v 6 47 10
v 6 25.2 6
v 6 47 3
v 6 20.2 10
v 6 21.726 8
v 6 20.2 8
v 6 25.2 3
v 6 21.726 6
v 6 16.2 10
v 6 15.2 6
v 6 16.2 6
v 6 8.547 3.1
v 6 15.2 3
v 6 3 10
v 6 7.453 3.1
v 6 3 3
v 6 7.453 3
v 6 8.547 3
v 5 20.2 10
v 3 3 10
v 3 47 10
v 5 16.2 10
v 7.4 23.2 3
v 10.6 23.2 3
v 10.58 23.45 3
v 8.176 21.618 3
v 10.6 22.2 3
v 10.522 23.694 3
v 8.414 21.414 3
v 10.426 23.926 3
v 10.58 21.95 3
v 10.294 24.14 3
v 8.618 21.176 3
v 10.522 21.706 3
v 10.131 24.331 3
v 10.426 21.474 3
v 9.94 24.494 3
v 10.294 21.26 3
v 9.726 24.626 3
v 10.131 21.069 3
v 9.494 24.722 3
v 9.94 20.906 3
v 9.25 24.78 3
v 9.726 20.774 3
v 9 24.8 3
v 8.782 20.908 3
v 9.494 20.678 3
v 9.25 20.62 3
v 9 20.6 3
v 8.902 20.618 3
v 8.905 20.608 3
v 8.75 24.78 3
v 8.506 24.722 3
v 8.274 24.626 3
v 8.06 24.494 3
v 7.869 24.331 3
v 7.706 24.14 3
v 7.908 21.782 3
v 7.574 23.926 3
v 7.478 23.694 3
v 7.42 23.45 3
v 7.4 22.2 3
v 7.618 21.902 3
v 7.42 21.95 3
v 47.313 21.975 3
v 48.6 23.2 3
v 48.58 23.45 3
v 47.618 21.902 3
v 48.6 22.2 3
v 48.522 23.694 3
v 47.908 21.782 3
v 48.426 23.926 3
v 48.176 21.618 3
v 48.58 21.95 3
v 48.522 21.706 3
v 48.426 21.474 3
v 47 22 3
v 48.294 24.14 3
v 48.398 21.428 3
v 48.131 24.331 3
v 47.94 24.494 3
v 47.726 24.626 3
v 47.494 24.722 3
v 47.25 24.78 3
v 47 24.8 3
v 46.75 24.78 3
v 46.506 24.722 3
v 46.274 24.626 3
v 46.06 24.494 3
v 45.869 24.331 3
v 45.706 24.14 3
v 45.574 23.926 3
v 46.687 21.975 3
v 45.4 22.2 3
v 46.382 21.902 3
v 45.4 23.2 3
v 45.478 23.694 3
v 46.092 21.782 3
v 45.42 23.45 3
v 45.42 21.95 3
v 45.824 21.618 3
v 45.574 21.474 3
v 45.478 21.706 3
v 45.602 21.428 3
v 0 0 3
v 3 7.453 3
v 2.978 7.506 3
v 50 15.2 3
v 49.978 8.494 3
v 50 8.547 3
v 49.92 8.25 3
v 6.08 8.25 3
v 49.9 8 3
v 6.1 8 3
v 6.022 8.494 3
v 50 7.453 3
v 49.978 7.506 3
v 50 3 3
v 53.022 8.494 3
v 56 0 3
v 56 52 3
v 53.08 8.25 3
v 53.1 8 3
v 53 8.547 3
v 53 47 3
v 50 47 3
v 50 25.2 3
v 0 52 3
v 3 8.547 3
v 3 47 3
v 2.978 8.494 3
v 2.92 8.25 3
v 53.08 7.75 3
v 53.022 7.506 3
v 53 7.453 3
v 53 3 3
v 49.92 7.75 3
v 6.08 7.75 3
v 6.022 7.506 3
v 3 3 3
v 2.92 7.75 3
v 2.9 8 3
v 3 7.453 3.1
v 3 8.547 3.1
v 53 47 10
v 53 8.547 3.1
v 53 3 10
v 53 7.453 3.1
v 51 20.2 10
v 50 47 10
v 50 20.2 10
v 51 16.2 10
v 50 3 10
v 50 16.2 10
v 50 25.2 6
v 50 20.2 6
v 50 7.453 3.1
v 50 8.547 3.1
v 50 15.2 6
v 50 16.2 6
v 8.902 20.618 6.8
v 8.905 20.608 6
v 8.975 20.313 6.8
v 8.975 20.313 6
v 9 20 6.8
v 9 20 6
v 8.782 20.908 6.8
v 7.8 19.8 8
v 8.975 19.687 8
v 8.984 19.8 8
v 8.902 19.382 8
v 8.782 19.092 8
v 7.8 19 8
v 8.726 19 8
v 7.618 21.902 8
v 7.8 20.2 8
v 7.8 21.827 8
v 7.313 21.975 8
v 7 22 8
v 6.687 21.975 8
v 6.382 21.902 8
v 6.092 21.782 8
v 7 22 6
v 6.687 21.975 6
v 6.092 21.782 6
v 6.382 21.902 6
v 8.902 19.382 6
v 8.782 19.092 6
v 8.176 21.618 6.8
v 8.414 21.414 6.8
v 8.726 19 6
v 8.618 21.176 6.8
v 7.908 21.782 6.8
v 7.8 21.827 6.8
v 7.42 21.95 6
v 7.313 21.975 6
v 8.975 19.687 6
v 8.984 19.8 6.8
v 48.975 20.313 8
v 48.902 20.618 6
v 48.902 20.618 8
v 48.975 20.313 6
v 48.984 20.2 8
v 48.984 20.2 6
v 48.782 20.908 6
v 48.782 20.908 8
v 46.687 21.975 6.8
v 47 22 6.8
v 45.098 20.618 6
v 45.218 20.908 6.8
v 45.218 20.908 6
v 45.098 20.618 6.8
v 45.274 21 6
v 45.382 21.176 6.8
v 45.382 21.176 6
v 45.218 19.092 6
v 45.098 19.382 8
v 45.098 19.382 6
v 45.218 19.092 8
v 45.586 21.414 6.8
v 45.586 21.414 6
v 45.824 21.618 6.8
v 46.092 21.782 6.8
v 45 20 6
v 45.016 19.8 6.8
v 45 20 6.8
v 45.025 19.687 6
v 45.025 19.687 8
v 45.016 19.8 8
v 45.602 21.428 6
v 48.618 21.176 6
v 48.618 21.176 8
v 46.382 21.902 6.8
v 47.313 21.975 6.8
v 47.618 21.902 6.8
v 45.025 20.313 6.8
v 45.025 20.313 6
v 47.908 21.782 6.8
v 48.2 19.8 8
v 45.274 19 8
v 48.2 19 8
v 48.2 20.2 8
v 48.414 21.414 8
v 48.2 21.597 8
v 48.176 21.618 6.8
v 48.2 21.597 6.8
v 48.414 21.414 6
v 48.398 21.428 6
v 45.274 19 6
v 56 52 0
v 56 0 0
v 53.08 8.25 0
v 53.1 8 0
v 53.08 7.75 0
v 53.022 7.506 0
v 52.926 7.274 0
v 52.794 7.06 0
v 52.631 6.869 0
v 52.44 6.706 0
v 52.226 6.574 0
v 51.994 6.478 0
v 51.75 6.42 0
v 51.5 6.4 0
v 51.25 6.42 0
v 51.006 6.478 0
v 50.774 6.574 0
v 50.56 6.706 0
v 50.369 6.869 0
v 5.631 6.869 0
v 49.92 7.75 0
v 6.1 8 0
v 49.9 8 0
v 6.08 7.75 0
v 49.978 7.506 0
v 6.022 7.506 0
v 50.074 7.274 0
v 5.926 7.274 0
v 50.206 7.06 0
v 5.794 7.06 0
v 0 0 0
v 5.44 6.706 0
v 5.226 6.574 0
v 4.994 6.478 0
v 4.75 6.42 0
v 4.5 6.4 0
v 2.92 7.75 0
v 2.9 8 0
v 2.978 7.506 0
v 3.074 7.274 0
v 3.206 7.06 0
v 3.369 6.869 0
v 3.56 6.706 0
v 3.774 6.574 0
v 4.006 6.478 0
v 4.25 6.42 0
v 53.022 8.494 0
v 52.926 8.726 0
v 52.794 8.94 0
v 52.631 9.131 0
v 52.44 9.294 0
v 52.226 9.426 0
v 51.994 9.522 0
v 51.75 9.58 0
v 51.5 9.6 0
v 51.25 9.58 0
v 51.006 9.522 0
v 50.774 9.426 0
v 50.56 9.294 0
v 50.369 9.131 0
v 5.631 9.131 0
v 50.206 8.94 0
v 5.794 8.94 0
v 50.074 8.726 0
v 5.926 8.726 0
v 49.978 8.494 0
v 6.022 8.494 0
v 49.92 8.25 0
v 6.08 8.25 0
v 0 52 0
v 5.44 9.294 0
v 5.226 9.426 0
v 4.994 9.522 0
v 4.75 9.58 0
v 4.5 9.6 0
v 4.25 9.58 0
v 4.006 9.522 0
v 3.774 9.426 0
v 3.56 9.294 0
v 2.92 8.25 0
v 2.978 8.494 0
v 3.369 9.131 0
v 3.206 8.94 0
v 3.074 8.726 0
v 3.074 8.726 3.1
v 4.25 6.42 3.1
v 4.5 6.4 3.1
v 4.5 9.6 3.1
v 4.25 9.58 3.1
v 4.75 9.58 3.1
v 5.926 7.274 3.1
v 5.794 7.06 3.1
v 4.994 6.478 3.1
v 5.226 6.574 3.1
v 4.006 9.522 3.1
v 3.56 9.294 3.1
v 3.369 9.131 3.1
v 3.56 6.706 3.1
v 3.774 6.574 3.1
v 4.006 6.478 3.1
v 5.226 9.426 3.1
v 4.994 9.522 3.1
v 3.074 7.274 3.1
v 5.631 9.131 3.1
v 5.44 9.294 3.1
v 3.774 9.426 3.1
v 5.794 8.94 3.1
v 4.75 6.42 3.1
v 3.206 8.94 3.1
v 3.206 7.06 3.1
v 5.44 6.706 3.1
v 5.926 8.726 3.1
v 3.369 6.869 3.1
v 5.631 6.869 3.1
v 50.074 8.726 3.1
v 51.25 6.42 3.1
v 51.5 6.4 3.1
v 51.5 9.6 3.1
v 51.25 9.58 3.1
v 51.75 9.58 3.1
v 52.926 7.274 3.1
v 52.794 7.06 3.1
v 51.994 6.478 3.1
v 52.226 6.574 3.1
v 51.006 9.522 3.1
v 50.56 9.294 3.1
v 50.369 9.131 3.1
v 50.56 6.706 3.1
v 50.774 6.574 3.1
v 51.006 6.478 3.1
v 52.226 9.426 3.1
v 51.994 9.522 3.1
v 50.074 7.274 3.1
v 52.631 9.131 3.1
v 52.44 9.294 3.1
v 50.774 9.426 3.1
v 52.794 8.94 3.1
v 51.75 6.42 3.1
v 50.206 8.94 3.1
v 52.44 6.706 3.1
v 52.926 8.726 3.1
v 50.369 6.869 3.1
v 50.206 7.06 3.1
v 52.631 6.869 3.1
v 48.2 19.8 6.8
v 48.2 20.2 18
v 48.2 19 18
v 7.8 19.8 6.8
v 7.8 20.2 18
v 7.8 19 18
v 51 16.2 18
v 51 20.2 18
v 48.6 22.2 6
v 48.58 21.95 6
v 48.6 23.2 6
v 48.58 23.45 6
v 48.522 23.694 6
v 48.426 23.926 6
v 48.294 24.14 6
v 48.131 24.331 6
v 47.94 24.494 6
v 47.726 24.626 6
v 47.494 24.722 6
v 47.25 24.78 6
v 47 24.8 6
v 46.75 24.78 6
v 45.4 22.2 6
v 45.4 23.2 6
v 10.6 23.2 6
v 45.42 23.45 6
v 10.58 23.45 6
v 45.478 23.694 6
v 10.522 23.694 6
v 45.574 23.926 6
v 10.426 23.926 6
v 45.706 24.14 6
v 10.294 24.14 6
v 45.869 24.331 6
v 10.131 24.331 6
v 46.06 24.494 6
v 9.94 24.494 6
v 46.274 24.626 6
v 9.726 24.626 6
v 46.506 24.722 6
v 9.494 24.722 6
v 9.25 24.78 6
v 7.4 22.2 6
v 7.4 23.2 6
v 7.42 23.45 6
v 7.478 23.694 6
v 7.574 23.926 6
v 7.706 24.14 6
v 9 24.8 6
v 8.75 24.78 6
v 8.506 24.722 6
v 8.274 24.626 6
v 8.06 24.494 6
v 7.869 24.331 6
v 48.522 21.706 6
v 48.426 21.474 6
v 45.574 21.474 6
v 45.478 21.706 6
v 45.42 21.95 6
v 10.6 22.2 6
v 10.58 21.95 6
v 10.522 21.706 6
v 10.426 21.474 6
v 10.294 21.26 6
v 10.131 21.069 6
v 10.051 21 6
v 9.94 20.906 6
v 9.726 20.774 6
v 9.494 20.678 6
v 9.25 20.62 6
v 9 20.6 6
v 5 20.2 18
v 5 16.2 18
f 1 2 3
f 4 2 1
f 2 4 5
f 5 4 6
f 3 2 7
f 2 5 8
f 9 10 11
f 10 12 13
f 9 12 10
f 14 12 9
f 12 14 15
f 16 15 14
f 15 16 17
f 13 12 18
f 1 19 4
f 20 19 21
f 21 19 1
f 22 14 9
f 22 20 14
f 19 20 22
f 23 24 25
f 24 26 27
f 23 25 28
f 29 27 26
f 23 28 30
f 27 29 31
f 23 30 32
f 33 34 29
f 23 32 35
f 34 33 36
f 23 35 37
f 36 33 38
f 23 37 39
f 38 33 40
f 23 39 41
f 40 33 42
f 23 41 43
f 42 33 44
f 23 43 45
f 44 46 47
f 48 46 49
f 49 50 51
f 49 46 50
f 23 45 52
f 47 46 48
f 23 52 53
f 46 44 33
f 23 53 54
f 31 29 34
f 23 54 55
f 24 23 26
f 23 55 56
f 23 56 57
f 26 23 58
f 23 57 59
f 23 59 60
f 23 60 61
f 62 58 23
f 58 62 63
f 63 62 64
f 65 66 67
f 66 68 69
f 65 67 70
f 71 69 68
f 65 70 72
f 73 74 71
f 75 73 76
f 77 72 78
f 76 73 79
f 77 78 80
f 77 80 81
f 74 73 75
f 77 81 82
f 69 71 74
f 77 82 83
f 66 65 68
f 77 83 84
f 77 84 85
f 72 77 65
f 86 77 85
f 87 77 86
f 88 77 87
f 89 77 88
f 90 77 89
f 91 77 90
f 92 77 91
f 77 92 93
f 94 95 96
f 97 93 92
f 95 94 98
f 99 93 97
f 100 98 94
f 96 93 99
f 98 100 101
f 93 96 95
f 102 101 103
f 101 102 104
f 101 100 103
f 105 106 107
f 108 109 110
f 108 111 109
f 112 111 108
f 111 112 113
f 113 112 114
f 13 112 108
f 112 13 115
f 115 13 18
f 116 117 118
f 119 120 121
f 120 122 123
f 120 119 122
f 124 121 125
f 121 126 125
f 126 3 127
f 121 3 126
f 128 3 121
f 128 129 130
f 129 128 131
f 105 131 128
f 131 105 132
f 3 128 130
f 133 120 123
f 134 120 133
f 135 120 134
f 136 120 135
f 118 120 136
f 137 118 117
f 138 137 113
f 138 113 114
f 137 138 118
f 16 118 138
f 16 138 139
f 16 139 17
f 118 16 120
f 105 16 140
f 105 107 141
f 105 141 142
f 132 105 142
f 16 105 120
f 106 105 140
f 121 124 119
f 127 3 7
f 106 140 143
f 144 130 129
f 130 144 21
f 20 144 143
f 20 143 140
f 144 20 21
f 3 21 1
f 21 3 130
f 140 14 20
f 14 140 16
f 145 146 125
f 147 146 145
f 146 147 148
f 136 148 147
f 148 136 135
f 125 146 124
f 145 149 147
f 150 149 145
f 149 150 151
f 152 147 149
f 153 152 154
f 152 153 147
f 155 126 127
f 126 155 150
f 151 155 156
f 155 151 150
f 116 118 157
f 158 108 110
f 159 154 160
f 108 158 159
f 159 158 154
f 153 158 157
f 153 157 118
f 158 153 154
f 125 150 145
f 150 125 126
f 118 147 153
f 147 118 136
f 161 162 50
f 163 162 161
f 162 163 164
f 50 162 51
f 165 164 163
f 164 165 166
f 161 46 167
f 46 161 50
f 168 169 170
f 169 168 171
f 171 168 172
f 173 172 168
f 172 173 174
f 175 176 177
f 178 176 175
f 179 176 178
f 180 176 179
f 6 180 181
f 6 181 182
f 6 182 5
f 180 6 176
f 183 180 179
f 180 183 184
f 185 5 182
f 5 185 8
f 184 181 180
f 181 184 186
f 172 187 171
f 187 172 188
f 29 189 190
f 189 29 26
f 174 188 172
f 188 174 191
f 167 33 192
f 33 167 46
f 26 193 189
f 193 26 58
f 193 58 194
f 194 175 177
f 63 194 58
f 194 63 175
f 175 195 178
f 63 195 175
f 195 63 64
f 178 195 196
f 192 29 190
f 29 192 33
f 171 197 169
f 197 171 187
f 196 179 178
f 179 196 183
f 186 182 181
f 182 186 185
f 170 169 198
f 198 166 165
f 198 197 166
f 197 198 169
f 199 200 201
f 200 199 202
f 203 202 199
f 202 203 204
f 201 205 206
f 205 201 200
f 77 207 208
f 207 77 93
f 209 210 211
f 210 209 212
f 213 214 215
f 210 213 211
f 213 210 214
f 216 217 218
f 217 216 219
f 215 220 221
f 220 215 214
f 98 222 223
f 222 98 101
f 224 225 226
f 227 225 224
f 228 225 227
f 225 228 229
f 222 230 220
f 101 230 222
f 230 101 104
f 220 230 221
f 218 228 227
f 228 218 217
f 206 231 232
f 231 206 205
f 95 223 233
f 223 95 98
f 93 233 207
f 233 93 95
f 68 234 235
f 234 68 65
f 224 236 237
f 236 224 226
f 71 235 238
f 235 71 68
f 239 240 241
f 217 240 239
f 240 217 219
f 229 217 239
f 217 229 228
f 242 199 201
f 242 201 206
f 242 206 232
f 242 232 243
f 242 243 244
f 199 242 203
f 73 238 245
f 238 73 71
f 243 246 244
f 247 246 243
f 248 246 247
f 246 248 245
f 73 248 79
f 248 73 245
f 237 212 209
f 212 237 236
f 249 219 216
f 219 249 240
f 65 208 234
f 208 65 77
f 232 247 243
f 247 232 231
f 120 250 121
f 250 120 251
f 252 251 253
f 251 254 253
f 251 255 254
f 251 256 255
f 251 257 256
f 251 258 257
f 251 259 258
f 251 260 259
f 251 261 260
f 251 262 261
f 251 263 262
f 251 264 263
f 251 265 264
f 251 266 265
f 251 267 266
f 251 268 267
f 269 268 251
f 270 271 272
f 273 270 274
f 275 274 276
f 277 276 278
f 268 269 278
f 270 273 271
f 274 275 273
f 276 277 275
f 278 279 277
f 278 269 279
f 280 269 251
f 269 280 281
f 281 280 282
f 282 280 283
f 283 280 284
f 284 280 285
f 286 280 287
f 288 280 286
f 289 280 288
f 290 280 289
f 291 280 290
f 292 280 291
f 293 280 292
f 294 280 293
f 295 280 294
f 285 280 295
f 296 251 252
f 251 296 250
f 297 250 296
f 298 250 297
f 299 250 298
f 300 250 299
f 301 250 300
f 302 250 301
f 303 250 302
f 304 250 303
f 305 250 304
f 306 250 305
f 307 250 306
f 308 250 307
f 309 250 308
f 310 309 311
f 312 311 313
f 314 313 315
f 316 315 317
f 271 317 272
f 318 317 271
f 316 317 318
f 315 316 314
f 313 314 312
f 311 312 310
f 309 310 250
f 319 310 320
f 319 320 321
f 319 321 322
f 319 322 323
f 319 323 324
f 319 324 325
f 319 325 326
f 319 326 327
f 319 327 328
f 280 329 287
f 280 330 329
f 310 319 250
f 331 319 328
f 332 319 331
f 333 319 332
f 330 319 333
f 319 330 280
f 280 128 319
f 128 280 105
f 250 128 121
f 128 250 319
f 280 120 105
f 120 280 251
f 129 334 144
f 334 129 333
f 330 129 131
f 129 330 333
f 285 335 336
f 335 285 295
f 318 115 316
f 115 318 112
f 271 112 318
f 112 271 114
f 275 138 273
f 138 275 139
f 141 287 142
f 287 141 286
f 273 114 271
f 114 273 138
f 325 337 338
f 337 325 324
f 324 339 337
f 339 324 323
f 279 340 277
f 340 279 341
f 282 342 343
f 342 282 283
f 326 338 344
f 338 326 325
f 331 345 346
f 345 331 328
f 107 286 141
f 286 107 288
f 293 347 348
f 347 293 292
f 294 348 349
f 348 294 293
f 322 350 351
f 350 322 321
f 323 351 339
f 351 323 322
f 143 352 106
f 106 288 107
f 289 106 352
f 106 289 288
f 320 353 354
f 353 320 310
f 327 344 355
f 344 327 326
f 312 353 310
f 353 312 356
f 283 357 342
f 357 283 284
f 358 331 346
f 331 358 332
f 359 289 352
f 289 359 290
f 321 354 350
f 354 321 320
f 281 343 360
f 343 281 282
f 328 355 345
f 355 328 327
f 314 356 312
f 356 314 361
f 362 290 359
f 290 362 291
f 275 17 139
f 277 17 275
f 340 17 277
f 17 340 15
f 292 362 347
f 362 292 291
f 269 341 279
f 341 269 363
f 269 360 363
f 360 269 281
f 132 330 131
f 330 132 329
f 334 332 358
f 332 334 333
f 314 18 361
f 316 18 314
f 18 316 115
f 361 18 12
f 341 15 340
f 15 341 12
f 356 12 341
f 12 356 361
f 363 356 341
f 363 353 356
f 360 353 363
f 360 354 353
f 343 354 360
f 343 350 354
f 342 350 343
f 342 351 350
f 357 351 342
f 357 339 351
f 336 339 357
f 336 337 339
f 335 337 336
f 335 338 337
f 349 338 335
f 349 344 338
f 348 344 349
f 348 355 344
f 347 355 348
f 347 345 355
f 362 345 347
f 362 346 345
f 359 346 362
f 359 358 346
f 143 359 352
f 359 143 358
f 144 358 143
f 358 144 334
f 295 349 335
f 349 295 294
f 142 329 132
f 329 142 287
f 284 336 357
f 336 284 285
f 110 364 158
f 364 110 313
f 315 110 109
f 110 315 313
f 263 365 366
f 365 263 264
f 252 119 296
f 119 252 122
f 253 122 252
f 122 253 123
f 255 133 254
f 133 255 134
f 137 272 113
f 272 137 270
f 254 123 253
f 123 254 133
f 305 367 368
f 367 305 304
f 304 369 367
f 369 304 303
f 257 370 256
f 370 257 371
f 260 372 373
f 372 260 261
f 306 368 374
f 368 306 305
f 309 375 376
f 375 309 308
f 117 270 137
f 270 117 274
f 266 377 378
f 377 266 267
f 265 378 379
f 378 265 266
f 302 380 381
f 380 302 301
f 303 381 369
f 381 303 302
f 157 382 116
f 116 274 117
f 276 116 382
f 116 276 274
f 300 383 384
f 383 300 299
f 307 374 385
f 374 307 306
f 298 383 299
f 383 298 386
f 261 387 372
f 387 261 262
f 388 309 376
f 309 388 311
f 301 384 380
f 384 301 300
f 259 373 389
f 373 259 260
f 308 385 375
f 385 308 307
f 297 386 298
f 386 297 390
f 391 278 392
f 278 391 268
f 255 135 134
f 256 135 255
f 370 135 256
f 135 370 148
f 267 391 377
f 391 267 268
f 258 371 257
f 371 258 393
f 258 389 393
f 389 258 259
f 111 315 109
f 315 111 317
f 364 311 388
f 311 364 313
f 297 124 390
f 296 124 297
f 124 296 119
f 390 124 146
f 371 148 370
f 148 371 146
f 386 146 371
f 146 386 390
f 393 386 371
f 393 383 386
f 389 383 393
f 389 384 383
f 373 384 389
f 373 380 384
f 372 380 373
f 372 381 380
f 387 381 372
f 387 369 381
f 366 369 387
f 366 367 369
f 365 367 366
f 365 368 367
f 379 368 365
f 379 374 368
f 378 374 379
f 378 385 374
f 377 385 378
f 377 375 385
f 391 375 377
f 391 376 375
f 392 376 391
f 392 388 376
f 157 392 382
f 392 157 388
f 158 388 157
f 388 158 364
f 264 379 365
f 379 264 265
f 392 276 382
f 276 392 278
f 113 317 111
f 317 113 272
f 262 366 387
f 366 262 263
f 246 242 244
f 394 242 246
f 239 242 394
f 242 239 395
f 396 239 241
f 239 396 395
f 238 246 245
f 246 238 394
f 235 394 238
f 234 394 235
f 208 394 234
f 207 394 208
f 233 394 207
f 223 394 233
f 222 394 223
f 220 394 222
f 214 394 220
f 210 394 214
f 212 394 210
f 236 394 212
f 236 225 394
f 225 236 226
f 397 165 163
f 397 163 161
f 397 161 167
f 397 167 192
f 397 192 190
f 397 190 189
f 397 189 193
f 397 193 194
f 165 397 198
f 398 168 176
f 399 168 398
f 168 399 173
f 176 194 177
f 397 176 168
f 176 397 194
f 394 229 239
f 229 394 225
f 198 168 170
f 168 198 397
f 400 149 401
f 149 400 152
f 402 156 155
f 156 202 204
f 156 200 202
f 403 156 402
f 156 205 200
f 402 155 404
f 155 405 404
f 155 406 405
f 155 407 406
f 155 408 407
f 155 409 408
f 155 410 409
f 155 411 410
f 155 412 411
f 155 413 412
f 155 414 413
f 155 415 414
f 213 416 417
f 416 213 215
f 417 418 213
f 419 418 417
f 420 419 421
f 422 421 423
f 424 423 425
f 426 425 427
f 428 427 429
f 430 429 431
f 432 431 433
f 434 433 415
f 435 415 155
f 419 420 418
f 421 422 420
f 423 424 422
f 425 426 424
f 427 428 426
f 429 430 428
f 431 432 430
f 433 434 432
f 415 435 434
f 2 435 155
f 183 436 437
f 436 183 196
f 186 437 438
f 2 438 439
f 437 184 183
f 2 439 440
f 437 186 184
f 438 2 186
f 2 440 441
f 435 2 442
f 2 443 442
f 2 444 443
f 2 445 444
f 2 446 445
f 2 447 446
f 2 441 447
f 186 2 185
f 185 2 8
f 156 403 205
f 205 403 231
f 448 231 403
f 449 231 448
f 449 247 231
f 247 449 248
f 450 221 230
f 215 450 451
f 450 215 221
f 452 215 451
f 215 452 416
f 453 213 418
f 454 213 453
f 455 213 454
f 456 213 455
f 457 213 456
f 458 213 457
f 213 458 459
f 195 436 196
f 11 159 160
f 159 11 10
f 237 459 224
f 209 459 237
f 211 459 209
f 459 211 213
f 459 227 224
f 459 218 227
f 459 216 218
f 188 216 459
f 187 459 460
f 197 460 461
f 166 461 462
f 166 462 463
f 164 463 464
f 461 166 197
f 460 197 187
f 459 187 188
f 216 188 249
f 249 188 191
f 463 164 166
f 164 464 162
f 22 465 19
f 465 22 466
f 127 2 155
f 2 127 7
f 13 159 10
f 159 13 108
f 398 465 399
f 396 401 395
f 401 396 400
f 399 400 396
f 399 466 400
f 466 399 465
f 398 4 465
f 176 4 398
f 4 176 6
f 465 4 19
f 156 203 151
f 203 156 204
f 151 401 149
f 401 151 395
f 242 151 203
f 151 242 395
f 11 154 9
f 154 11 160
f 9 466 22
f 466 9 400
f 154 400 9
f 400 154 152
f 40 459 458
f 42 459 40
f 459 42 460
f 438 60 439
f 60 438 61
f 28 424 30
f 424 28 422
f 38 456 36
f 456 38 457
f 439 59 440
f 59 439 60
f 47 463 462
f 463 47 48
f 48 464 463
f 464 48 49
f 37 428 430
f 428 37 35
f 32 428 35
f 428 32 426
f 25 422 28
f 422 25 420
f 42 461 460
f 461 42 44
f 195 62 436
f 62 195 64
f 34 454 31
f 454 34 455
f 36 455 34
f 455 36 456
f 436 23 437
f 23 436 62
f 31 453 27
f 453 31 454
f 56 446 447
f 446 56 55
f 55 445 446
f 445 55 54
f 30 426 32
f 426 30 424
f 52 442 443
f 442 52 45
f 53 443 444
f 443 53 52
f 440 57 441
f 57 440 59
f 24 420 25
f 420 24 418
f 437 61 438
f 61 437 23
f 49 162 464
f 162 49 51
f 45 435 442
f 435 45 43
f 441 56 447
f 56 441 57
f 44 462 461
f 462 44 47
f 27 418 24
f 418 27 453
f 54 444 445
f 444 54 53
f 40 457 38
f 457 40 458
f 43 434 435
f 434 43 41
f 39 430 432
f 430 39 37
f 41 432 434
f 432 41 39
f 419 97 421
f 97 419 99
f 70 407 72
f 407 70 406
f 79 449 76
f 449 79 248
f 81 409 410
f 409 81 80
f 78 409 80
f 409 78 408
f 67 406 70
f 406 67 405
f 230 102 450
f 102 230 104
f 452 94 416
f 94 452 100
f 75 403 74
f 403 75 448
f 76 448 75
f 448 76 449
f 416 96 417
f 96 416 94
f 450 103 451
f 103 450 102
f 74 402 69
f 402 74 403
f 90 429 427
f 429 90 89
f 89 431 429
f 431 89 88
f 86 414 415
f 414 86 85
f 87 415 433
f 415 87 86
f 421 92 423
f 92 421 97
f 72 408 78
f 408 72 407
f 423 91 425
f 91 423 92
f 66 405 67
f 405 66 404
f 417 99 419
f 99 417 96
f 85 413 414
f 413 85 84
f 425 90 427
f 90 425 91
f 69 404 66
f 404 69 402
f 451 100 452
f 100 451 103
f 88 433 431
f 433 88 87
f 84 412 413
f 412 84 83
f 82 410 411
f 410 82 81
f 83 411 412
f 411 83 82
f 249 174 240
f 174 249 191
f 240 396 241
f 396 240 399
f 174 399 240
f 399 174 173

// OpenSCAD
// file: ../common/tile_dimensions.scad
// Shared grid and PCB body contract. See docs/specifications/interfaces.md.
tile_size = 80;
tile_height = 20;
pcb_mount_spacing = 30;
pcb_mount_height = 9;
pcb_preview_size = 68;
pcb_preview_thickness = 1.6;
pcb_preview_hole_diameter = 2.5;
mount_spacing = 24;

// KiCad origin (100,100), CAD X = pcb X-100, CAD Y = 100-pcb Y.
pcb_led_centers = [[-17,23],[17,-23]];

// M2 PCB mounting: ordinary nuts, no inserts or thread-forming screws.
pcb_screw_clearance = 2.2;
pcb_nut_af = 4.3;     // 4.0mm nominal nut plus 0.3mm across-flat clearance.
pcb_nut_depth = 1.8;  // For <=1.6mm nut thickness.

// Hub PCB is elevated so USB plugs clear adjacent tiles and 5.5mm module bases.
hub_height = 42;
hub_pcb_top = 30;
hub_usb_opening_width = 20;
hub_usb_opening_height = 10;
// main file
// Unpowered Harwin side-compression test. No production tile geometry.
include <../common/tile_dimensions.scad>
$fn=40;
part="assembly"; // bed, slider, assembly
mate_y=19; // Nominal starting plane only; measure the spring front.
travel=0; // Set zero from measured first touch, never from this envelope.
assert(travel>=0 && travel<=0.5);
board_t=pcb_preview_thickness;
module bed() {
 difference() {
  union() {
   cube([56,52,3]);
   for(x=[3,50]) translate([x,3,3]) cube([3,44,7]);
   for(x=[7,47]) translate([x,20,3]) cylinder(d=4,h=5);
  }
  // A 40 x 28 mm horizontal coupon slides in from the rear.
  translate([7.8,19.8,6.8]) cube([40.4,29,board_t+0.4]);
  for(x=[4.5,51.5]) translate([x,8,-0.1]) cylinder(d=3.2,h=3.2);
 }
}
module slider() {
 difference() {
  union() {
   cube([46,10,3]);
   translate([0,1,3]) cube([46,4,12]);
  }
  // Vertical 40 x 12 mm flat-pad coupon; tin mate finish must be qualified.
  translate([2.8,3.8,3]) cube([40.4,board_t+0.4,13]);
  for(x=[4,42]) translate([x,7,-0.1]) hull() {
   cylinder(d=3.2,h=3.2);translate([0,1,0]) cylinder(d=3.2,h=3.2);
  }
 }
}
if(part=="bed" || part=="assembly") bed();
if(part=="slider") slider();
if(part=="assembly") {
 translate([5,mate_y-3.8+travel,3]) slider();
 if($preview) {
  color("green") translate([8,20,7]) cube([40,28,board_t]);
  color("darkgreen") translate([8,mate_y+travel,6]) cube([40,board_t,12]);
 }
}
// Use external clamps / a screw stage and measured shims for contact force.
// Slots locate coupons; their friction is not a force measurement.
